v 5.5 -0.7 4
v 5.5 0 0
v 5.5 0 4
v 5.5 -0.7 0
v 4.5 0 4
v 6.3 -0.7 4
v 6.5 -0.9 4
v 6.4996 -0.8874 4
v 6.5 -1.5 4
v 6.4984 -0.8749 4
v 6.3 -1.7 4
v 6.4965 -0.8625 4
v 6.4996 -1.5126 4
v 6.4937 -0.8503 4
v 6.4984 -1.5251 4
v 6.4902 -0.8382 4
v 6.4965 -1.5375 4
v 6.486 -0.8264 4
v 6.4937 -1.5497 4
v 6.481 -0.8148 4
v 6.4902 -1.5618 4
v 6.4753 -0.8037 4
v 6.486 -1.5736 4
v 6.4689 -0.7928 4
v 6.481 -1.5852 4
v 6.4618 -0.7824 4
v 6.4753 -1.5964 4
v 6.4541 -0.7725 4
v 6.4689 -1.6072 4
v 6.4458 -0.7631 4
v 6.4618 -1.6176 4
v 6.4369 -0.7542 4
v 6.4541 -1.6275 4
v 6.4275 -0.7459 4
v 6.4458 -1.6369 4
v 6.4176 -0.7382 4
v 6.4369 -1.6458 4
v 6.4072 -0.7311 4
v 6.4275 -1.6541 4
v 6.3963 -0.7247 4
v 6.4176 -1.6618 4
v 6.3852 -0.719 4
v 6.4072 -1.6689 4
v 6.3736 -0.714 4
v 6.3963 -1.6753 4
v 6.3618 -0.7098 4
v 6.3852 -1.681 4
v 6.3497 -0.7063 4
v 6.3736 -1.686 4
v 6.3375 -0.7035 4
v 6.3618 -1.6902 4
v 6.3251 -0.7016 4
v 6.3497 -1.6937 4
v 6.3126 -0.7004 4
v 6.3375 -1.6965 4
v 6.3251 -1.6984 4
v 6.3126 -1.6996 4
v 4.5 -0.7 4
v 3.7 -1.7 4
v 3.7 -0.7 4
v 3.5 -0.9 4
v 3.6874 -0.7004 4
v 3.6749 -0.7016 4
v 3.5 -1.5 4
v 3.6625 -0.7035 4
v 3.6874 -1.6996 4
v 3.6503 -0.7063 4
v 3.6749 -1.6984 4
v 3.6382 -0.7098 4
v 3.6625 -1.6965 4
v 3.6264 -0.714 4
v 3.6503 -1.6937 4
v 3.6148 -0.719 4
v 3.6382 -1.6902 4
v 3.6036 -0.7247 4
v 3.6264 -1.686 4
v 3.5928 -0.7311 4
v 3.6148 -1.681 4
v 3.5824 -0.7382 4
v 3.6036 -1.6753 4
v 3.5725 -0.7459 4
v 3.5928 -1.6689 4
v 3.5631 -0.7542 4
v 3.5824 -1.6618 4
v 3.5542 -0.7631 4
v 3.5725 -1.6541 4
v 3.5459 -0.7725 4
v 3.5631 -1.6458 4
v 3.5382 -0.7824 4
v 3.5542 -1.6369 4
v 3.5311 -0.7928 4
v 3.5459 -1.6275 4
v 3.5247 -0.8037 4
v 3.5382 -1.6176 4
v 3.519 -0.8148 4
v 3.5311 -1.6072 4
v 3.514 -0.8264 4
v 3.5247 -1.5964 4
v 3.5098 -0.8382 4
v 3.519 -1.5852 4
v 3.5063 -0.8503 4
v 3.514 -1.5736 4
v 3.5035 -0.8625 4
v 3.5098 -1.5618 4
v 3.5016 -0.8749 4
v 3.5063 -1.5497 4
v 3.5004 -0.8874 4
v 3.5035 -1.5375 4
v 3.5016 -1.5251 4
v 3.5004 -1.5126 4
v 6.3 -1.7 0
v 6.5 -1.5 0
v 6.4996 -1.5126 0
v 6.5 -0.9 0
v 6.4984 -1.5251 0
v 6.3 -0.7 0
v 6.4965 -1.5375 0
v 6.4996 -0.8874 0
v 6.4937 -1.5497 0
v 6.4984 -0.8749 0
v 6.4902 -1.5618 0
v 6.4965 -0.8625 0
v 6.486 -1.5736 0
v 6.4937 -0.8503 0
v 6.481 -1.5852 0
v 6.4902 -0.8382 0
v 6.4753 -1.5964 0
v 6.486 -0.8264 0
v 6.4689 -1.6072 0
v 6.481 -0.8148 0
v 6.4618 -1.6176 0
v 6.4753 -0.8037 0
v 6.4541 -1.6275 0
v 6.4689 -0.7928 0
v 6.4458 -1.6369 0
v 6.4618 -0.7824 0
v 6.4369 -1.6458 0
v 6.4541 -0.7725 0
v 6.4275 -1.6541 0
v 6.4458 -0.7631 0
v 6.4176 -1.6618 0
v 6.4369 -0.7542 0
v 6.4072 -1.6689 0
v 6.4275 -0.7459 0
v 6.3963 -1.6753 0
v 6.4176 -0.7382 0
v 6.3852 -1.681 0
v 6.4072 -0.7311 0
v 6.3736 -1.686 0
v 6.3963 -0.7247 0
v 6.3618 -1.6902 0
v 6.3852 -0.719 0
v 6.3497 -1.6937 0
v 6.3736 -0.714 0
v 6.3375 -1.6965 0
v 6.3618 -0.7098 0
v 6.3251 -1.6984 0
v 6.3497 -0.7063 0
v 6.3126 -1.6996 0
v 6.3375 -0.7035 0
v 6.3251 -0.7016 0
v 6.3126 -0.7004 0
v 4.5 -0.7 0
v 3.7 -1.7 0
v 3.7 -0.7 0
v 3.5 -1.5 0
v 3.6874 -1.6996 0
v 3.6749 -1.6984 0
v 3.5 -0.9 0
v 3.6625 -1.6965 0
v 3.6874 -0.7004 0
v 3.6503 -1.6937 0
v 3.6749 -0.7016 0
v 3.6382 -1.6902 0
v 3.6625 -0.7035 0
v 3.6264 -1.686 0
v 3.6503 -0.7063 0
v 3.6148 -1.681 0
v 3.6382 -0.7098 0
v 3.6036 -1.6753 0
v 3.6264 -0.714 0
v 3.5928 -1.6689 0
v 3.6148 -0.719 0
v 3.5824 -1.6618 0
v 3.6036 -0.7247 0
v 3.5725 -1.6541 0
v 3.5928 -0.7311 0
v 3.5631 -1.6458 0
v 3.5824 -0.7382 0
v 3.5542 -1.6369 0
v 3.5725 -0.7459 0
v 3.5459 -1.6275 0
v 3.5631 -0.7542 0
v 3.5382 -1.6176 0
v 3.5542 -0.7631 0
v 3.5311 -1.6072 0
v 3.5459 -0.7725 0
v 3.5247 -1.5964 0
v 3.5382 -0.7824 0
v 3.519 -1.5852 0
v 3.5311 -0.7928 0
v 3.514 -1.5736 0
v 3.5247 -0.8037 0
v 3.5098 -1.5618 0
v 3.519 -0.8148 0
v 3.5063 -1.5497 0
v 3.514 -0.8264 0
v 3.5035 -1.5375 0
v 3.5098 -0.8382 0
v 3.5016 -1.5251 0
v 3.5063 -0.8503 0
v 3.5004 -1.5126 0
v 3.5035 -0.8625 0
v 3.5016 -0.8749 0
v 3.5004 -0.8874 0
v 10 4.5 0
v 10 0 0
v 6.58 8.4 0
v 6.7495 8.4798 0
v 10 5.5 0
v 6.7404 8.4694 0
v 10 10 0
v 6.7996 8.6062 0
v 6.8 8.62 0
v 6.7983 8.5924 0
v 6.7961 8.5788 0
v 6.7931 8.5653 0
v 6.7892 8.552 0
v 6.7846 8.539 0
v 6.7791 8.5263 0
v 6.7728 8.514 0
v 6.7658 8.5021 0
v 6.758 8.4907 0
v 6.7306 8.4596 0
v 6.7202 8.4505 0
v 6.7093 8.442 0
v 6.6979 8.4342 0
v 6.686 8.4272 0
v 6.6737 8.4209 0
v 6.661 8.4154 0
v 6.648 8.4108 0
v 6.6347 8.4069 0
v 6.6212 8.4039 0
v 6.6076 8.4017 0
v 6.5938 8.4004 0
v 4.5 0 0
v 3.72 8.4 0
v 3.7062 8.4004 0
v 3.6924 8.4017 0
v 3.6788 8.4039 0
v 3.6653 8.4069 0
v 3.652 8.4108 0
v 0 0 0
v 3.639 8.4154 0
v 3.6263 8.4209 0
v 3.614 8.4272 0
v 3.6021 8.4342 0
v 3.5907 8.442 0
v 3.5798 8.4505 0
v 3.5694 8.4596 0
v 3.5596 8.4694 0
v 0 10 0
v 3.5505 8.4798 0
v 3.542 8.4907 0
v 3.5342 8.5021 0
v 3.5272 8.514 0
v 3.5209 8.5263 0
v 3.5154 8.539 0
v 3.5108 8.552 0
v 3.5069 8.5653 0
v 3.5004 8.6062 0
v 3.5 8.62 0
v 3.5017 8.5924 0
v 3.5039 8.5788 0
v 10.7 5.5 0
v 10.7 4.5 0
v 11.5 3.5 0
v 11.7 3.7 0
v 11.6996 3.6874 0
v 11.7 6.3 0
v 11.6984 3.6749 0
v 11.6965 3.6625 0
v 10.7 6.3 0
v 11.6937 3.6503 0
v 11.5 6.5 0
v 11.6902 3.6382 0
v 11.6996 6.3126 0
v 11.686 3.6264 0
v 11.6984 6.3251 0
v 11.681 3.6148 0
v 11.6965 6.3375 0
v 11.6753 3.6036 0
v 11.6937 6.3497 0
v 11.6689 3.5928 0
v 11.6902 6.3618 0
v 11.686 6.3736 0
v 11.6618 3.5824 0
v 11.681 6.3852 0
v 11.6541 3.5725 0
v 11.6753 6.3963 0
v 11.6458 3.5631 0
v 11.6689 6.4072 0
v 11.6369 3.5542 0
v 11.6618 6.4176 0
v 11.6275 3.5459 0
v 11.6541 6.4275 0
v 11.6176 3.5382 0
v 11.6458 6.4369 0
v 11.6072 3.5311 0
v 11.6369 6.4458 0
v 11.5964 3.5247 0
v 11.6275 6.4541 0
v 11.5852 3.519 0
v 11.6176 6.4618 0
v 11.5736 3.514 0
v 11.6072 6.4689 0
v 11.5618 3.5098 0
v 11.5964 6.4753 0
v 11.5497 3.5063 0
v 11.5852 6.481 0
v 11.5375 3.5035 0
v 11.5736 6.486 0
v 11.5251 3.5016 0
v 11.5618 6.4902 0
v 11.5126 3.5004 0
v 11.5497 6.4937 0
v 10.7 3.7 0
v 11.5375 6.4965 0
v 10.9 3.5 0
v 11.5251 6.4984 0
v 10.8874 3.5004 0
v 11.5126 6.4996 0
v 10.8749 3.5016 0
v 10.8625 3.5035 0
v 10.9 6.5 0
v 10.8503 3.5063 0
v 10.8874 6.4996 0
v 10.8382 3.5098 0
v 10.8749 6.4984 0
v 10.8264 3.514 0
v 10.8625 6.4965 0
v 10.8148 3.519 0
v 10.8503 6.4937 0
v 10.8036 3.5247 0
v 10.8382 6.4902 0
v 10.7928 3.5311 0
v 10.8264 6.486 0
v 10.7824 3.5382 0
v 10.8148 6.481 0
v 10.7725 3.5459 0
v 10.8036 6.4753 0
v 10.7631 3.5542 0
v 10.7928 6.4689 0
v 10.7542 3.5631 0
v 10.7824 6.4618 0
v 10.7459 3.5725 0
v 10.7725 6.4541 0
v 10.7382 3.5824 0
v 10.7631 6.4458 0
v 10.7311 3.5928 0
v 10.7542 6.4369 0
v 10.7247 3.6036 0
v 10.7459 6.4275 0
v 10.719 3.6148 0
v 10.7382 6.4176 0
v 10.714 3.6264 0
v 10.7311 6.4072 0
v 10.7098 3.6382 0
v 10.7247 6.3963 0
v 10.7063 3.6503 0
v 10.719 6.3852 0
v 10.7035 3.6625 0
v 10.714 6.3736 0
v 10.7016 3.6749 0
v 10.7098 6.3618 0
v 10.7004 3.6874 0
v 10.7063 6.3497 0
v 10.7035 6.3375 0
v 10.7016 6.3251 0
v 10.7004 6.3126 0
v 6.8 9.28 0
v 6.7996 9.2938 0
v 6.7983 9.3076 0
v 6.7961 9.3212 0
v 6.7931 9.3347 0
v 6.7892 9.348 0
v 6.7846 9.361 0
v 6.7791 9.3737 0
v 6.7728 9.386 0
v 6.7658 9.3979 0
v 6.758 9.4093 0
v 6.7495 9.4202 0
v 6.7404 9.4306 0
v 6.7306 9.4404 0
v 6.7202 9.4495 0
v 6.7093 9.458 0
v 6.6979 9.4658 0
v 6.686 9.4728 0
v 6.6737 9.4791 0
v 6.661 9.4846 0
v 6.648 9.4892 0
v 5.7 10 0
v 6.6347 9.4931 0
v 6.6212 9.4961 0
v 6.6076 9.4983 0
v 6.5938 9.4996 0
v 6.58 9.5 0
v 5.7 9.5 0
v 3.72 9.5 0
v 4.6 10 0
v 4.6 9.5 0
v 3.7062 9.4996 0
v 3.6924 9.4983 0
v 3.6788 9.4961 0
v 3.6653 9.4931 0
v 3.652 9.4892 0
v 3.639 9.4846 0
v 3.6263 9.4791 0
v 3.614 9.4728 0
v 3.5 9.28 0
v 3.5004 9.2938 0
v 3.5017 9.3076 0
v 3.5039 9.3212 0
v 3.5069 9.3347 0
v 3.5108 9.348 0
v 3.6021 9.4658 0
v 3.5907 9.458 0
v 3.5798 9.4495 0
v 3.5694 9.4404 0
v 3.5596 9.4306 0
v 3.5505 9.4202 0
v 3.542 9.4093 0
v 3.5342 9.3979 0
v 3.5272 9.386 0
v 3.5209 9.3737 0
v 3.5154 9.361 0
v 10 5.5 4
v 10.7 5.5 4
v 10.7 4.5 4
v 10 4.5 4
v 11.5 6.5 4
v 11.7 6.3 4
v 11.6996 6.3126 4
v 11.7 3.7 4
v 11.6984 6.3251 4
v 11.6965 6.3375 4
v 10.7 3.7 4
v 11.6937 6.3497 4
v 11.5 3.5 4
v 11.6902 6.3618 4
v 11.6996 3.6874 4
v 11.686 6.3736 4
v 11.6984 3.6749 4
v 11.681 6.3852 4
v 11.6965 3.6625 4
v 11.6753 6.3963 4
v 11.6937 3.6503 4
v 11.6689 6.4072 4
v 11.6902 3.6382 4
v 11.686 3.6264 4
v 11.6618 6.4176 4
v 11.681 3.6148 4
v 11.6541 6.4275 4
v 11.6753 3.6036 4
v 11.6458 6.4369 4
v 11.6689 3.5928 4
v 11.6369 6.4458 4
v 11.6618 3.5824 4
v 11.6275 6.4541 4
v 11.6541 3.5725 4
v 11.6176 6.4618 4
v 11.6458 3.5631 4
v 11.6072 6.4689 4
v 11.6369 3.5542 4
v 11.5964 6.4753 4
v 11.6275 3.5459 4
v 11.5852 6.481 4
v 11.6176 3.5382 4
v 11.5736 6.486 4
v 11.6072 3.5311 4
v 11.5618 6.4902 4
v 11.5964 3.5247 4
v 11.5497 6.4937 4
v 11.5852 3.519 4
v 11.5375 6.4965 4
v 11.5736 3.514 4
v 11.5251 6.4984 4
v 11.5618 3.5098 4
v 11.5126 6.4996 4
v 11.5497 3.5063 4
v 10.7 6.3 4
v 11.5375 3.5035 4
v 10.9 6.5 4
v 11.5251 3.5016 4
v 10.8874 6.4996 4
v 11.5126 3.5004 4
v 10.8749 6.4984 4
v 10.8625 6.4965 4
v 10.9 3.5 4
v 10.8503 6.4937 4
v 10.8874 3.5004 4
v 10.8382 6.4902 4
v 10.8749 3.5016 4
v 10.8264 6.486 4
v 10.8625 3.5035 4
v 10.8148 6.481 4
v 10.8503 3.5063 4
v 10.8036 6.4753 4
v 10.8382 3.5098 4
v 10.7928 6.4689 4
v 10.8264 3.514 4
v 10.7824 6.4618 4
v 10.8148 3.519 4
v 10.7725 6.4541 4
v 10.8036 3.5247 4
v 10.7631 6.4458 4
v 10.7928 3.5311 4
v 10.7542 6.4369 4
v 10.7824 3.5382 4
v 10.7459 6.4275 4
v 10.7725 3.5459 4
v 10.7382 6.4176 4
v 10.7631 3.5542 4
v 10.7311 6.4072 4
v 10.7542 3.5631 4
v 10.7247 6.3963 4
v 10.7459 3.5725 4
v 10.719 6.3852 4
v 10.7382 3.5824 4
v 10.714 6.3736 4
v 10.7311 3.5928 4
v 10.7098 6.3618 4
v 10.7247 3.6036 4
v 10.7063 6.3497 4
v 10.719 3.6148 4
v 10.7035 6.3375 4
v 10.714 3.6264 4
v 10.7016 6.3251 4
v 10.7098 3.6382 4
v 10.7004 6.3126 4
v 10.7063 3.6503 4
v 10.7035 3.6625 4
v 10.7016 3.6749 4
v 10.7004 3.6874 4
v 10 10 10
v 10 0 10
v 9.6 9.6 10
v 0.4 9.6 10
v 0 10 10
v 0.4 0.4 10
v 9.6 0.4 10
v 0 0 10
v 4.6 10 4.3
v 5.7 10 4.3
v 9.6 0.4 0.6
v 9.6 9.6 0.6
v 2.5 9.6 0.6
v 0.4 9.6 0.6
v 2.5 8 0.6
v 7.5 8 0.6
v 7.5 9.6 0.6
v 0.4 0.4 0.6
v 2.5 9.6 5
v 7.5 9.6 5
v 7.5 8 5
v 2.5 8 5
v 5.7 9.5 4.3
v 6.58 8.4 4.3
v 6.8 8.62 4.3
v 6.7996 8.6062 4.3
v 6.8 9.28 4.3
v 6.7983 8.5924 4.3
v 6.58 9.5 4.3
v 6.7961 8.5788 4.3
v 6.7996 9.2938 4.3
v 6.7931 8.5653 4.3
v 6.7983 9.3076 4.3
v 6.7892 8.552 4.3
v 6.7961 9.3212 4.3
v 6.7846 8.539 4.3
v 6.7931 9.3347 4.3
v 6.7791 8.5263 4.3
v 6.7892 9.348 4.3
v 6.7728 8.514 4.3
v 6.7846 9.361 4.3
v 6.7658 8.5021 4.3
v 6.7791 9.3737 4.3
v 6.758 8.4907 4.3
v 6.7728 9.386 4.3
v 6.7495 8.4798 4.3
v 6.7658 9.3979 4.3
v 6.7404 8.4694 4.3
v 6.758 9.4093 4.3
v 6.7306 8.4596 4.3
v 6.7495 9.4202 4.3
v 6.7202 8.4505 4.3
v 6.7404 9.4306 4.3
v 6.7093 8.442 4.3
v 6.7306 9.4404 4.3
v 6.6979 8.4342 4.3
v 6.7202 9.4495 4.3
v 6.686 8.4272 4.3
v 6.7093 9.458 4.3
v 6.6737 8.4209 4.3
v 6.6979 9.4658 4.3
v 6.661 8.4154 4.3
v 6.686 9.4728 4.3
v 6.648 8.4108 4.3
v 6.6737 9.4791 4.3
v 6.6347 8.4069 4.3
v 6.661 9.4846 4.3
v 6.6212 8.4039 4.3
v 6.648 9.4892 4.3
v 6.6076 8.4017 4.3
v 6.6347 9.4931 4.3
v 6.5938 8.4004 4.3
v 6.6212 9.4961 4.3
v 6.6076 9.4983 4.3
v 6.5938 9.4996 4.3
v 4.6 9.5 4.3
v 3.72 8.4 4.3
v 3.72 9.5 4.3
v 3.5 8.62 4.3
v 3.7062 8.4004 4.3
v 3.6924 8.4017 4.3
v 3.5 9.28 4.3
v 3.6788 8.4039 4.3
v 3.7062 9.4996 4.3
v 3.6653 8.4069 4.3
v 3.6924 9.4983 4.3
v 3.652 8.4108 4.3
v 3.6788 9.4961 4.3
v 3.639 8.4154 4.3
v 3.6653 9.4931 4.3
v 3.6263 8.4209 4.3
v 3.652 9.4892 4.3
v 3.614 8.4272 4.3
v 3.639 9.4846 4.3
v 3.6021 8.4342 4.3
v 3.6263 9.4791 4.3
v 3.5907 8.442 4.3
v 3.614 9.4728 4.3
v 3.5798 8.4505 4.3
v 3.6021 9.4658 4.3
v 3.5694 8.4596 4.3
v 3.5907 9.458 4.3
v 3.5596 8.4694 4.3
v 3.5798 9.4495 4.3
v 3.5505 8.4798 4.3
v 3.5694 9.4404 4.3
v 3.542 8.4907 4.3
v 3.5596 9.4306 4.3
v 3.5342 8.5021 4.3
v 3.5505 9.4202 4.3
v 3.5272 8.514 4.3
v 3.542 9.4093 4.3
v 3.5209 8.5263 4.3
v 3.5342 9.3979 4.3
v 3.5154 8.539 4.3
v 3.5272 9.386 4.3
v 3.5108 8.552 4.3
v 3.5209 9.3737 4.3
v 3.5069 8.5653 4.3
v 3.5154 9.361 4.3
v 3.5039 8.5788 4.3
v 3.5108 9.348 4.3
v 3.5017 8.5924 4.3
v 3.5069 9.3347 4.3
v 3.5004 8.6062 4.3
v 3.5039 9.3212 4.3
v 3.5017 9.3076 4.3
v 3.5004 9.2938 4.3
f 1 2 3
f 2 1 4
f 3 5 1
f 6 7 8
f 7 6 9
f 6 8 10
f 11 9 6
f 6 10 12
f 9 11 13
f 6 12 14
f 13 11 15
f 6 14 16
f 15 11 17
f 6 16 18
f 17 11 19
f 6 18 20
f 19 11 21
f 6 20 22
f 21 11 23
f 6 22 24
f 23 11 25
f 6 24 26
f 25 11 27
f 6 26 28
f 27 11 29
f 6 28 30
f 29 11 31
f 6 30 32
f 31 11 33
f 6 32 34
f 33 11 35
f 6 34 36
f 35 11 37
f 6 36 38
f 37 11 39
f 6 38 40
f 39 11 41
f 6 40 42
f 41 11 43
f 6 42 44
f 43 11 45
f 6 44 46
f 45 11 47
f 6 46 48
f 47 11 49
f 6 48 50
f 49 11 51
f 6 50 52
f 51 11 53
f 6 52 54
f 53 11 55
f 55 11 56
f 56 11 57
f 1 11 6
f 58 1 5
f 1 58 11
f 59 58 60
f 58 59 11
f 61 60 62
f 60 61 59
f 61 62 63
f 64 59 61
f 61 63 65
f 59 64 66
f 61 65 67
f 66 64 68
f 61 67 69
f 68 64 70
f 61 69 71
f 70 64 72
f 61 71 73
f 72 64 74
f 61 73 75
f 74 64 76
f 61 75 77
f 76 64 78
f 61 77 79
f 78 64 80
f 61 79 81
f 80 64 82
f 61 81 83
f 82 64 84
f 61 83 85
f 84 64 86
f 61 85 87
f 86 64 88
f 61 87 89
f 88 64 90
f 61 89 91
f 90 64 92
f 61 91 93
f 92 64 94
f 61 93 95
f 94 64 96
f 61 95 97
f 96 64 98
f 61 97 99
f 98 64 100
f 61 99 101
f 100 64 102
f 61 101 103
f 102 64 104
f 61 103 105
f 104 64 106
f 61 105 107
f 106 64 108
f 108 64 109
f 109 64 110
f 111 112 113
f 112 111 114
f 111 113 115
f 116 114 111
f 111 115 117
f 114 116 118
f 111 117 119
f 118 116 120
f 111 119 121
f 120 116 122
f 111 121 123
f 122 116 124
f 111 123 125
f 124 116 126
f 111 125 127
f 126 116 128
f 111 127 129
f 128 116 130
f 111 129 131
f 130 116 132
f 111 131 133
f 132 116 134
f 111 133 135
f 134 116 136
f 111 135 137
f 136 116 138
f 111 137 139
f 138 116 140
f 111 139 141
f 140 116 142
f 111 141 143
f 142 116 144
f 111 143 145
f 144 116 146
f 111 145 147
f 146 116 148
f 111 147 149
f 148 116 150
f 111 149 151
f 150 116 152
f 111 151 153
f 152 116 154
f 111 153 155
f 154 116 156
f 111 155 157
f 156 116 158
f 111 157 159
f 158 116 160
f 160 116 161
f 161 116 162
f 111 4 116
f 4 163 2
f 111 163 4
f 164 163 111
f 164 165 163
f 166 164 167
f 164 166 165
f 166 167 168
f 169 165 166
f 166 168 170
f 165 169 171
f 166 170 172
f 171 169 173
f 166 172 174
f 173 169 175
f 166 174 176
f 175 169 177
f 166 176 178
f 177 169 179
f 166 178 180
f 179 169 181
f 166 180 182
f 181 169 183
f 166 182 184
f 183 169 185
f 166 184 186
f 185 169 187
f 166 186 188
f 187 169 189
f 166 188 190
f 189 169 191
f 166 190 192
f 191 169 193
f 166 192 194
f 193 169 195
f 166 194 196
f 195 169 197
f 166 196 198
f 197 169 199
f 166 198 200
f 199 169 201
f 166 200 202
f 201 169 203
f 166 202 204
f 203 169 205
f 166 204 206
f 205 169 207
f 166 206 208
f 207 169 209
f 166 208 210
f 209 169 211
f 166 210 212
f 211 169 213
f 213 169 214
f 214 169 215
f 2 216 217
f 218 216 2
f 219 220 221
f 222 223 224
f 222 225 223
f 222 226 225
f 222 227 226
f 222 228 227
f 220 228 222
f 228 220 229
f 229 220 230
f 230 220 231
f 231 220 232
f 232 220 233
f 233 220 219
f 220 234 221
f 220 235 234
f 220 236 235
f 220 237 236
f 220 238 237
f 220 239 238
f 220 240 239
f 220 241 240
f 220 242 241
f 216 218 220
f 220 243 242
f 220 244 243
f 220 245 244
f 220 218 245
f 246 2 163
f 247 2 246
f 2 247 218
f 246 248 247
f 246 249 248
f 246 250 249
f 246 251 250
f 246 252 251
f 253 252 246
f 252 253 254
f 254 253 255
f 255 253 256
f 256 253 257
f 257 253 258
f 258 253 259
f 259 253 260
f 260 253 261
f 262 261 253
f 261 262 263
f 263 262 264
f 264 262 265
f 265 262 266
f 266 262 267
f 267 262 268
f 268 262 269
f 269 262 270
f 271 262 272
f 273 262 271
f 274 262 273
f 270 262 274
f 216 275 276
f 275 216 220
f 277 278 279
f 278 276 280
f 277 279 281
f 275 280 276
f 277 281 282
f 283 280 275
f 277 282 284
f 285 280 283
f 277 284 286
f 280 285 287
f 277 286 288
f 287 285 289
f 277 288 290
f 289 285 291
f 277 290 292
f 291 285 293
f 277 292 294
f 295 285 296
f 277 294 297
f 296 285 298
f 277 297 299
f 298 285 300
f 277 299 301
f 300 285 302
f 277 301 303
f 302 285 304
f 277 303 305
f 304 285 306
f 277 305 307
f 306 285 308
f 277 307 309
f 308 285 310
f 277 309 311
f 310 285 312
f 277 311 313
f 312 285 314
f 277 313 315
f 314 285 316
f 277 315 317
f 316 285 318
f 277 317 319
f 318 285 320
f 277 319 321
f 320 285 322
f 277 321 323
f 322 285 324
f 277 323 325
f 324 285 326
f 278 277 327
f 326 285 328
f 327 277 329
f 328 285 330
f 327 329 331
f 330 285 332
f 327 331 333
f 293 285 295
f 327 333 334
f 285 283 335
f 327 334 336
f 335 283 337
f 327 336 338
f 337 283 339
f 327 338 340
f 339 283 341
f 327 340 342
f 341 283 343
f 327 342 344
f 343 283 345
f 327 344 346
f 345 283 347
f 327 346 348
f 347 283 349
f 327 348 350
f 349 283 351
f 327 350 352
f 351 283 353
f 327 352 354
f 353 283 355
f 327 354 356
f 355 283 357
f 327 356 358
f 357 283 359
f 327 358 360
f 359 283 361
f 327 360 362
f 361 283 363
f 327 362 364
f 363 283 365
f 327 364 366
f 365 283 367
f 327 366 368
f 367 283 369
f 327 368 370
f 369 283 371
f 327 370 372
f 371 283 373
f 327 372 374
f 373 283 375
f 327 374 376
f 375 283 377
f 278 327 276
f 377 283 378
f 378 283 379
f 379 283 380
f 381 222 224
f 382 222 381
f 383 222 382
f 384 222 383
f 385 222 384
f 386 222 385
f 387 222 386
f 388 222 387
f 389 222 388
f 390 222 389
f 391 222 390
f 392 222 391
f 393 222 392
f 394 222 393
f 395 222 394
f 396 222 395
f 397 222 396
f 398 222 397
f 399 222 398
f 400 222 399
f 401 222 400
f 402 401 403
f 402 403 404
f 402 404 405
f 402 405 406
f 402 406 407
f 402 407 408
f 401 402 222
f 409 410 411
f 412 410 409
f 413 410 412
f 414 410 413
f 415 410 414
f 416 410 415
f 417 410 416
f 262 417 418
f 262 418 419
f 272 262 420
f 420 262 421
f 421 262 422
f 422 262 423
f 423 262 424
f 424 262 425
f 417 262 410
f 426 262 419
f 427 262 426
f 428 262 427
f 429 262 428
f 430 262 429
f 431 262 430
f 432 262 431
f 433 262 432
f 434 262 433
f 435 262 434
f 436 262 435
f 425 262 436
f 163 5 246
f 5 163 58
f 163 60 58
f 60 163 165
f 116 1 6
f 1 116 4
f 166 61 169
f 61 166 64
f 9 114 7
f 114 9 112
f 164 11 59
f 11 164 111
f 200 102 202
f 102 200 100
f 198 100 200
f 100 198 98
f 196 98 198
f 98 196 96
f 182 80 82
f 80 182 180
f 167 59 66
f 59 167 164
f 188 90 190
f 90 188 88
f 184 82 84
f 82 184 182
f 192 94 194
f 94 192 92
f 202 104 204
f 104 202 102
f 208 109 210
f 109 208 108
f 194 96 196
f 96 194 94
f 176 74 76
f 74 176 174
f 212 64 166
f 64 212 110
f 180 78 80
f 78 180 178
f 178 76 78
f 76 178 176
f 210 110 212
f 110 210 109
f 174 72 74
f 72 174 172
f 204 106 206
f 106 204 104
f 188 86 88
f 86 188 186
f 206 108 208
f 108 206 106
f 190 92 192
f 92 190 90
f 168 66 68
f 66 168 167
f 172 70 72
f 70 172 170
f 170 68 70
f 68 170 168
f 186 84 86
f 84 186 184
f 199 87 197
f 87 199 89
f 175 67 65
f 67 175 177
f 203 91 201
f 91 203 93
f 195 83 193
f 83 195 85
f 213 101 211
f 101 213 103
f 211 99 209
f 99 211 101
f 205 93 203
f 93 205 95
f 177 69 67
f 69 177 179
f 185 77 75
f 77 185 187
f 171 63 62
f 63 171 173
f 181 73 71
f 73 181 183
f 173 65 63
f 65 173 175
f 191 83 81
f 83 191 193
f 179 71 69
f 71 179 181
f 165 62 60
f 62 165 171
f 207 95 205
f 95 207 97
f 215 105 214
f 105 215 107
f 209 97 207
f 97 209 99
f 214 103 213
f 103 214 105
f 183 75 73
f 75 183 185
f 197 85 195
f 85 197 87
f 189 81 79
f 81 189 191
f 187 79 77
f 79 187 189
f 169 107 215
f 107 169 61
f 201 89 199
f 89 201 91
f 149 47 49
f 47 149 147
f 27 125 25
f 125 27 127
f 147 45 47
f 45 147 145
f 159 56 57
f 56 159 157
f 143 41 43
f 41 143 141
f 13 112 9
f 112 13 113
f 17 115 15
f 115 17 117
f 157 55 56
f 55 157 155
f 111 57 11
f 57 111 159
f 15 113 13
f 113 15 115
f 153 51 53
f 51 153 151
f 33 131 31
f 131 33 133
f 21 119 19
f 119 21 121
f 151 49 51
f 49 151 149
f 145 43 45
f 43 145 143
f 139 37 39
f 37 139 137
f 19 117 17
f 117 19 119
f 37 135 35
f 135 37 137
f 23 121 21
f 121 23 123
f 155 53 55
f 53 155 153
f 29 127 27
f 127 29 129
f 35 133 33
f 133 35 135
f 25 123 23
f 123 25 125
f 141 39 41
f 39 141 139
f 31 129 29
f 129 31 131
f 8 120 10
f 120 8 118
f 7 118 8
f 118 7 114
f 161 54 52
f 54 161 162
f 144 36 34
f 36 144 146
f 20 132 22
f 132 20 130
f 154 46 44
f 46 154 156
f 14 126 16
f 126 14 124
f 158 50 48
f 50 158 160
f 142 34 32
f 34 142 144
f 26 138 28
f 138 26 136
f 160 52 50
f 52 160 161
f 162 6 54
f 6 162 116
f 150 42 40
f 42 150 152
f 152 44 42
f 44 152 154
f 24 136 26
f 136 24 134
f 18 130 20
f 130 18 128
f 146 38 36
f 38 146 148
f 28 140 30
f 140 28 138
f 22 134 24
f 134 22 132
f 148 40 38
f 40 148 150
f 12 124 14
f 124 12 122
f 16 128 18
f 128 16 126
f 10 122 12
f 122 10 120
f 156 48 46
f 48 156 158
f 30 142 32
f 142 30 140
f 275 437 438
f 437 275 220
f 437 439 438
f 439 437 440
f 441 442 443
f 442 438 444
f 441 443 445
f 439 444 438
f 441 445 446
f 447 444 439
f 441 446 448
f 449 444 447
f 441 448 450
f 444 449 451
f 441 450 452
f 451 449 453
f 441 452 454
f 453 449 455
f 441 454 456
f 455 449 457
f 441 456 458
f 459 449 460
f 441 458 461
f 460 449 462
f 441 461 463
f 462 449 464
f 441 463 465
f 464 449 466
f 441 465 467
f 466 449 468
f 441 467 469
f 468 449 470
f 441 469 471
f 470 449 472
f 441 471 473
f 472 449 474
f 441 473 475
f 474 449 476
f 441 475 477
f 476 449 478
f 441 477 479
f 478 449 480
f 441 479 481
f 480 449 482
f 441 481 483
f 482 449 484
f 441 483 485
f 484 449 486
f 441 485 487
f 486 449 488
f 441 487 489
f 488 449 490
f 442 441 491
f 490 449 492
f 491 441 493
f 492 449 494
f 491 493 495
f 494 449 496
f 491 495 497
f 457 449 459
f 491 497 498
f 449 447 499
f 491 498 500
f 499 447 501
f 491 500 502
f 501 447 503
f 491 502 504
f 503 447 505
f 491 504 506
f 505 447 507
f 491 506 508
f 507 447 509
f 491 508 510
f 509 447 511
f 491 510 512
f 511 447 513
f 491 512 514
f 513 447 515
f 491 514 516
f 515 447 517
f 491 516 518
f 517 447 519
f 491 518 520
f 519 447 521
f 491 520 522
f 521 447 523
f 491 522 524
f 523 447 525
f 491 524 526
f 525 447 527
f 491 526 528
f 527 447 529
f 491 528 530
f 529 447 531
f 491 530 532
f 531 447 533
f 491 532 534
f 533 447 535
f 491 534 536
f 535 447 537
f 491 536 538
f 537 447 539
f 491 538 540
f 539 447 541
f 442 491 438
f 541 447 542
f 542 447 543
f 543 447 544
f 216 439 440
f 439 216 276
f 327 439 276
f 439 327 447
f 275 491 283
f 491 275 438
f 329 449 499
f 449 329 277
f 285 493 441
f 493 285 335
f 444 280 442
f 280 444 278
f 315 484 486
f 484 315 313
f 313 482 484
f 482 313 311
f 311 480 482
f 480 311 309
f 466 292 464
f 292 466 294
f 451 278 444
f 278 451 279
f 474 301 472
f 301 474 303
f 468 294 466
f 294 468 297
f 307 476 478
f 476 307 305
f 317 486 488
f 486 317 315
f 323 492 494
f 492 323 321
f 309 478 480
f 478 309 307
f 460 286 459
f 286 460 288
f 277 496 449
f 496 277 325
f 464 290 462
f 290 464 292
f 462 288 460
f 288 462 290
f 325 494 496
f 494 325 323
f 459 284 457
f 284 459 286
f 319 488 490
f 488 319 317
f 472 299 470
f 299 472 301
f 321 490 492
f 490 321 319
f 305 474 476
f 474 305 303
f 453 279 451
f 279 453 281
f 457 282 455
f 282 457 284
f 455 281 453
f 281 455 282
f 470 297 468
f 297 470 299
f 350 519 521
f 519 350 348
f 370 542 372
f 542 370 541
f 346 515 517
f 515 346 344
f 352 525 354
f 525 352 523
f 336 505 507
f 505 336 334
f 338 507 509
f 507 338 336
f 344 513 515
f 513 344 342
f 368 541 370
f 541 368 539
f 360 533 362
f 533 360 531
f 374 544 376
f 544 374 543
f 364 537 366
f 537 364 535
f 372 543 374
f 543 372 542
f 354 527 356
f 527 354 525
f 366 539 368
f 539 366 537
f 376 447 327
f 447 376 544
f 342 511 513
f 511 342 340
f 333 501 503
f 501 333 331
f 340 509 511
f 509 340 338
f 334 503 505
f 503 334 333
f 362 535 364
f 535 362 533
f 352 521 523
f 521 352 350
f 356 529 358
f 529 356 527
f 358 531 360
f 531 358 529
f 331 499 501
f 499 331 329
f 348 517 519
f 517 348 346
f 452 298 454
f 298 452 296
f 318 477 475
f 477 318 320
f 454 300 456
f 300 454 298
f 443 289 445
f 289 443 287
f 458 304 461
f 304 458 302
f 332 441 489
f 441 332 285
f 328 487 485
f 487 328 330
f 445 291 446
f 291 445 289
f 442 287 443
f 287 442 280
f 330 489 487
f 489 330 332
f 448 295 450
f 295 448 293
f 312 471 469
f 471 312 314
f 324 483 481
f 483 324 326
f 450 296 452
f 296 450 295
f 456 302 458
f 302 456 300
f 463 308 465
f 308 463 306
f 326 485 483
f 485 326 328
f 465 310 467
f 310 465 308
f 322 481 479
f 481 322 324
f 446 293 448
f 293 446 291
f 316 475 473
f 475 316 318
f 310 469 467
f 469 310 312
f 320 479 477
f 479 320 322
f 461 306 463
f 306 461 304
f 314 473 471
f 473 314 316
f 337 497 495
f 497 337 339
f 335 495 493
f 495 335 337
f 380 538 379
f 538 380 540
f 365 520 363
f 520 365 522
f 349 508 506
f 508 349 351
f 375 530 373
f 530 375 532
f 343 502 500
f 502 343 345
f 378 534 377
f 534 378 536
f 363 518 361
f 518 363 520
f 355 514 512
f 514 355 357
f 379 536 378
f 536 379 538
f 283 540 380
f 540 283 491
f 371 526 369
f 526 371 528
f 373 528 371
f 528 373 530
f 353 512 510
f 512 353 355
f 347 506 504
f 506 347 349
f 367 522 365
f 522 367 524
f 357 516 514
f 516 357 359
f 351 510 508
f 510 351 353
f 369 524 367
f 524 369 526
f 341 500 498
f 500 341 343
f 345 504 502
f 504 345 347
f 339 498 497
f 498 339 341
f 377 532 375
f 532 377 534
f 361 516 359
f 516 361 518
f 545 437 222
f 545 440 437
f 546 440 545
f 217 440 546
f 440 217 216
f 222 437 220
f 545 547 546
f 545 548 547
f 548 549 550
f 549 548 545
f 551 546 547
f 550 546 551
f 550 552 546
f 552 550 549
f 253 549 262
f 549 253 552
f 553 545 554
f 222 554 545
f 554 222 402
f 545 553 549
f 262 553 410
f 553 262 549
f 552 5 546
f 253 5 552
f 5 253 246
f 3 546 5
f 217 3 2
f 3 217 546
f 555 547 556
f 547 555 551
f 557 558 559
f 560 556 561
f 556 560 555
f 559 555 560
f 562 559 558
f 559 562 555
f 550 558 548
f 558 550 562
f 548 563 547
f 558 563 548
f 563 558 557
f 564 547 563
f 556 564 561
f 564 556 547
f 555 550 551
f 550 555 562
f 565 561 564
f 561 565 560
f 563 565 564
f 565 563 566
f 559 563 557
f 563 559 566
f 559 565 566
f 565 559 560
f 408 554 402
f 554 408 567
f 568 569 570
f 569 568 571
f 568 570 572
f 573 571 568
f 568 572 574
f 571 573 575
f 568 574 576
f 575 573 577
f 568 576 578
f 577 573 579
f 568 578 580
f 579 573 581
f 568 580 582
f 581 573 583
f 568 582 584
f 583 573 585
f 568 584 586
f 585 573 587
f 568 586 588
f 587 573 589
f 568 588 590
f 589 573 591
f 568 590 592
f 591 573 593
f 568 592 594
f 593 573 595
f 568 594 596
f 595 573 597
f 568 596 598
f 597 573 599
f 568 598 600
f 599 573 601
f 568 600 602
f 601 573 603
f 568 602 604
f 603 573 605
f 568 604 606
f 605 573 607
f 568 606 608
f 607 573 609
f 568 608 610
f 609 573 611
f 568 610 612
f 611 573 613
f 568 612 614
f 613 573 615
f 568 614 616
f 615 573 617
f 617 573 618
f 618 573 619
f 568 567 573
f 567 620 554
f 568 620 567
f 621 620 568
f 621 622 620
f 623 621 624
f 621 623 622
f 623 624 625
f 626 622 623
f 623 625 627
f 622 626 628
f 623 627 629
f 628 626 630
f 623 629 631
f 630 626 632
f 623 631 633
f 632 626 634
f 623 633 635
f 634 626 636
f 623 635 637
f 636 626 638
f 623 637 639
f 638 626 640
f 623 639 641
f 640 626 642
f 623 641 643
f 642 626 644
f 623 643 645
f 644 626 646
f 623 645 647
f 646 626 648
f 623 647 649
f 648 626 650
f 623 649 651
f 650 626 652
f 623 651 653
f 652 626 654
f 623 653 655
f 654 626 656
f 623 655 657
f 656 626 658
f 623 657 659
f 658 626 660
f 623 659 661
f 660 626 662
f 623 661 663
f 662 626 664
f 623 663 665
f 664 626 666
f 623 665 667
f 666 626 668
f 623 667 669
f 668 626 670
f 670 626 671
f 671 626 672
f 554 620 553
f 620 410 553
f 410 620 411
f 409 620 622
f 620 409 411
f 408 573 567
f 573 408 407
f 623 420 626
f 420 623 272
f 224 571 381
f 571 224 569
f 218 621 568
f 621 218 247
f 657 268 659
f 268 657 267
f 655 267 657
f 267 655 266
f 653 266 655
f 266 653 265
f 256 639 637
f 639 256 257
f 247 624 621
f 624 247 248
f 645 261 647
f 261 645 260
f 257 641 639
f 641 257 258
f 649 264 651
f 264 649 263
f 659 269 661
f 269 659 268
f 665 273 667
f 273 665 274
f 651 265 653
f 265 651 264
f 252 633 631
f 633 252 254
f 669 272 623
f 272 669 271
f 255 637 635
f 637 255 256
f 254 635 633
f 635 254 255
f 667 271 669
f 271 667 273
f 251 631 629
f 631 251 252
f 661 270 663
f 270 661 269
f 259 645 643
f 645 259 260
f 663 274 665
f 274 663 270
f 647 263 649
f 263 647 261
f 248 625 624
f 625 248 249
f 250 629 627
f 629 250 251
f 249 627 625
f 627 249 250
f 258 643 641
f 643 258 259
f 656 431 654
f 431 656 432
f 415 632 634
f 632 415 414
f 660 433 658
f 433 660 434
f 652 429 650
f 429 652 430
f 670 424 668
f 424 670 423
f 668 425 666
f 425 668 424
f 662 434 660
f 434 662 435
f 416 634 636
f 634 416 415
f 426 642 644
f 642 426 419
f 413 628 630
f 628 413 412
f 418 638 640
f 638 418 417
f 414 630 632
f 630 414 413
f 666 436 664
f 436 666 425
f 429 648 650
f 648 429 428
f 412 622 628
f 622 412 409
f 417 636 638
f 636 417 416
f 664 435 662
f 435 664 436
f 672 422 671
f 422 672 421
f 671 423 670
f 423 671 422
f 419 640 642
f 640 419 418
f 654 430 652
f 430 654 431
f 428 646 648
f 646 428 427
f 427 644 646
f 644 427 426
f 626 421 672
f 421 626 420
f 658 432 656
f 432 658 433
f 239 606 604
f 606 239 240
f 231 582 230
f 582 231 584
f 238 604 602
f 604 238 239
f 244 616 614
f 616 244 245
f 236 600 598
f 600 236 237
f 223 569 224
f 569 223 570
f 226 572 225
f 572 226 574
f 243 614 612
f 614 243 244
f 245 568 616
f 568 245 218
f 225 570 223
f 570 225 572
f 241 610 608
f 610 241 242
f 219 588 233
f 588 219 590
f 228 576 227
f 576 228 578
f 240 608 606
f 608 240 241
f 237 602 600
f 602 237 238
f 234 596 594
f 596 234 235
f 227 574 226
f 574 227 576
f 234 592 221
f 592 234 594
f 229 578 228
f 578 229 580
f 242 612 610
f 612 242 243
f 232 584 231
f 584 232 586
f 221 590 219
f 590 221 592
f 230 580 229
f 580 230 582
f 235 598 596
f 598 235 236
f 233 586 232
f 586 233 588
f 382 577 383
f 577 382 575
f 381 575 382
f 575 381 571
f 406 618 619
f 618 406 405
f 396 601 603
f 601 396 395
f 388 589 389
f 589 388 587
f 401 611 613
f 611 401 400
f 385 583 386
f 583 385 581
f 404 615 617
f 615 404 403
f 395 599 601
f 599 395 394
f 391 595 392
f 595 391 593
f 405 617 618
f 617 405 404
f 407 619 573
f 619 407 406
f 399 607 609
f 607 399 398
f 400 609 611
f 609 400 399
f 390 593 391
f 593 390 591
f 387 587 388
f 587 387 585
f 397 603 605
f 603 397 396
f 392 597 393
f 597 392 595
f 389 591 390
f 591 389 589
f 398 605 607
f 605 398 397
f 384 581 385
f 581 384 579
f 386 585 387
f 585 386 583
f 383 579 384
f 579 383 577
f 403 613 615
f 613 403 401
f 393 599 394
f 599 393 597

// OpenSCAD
wallSize = 0.4;
 /*   translate([holeOffsetX, holeOffsetY, holeOffsetZ])
    rotate([90, 0, 0]) 
    minkowski() {
            $fn=100; 
            cube([holeSizeX, holeSizeZ, holeSizeY]);
            rotate([0, 180, 0]) cylinder(r=boxSpacing, h=boxSpacing);
        }
        
    }*/
module getConnector(dimensions, handle, rounding) {
    translate([(dimensions[0]-handle[0])/2, dimensions[1], 0]) cube([handle[0], handle[1], dimensions[2]]);
    $fn=100; 

    translate([rounding, rounding, 0]) cube([dimensions[0]-2*rounding, dimensions[1]-2*rounding, dimensions[2]]); // ok
    translate([0, rounding, 0]) cube([rounding, dimensions[1] - 2*rounding, dimensions[2]]);//ok
    translate([dimensions[0]-rounding, rounding, 0]) cube([rounding, dimensions[1] - 2*rounding, dimensions[2]]);//ok
    translate([rounding, 0, 0]) cube([dimensions[0] -2*rounding, rounding, dimensions[2]]); // ok
    translate([rounding, dimensions[1]-rounding, 0]) cube([dimensions[0] - 2*rounding, rounding, dimensions[2]]); //ok
    
    translate([rounding, rounding, 0]) cylinder(r=rounding, h=dimensions[2]); // ok
    translate([rounding, dimensions[1] - rounding, 0]) cylinder(r=rounding, h=dimensions[2]); //ok 
    translate([dimensions[0]-rounding, rounding, 0]) cylinder(r=rounding, h=dimensions[2]); // ok
    translate([dimensions[0]-rounding, dimensions[1] - rounding*1, 0]) cylinder(r=rounding, h=dimensions[2]); // ok
}

module getBox(box, floorThickness) {
    difference() {
        cube(box);
        translate([wallSize, wallSize, floorThickness])cube([box[0]-wallSize*2, box[1]-wallSize*2, box[2]]);
    }
    translate([0, box[1]-2, 0]) {
        translate([(box[0]-box[0]/2)/2, 0, 0])cube([box[0]/2, 2, box[2]/2]);
    }
}



translate([3.5, -1.70, 0]) getConnector([3, 1, 4], [1, 0.80], 0.2);
rotate([0, 0, 90]) translate([3.5, -10-1.70, 0]) getConnector([3, 1, 4], [1, 0.80], 0.2);

difference() {
    getBox([10, 10, 10], 0.6);
    translate([3.5, 10-1.6, -0.1]) scale([1.1, 1.1, 1.1])getConnector([3, 1, 4], [1, 0.6], 0.2);
}
